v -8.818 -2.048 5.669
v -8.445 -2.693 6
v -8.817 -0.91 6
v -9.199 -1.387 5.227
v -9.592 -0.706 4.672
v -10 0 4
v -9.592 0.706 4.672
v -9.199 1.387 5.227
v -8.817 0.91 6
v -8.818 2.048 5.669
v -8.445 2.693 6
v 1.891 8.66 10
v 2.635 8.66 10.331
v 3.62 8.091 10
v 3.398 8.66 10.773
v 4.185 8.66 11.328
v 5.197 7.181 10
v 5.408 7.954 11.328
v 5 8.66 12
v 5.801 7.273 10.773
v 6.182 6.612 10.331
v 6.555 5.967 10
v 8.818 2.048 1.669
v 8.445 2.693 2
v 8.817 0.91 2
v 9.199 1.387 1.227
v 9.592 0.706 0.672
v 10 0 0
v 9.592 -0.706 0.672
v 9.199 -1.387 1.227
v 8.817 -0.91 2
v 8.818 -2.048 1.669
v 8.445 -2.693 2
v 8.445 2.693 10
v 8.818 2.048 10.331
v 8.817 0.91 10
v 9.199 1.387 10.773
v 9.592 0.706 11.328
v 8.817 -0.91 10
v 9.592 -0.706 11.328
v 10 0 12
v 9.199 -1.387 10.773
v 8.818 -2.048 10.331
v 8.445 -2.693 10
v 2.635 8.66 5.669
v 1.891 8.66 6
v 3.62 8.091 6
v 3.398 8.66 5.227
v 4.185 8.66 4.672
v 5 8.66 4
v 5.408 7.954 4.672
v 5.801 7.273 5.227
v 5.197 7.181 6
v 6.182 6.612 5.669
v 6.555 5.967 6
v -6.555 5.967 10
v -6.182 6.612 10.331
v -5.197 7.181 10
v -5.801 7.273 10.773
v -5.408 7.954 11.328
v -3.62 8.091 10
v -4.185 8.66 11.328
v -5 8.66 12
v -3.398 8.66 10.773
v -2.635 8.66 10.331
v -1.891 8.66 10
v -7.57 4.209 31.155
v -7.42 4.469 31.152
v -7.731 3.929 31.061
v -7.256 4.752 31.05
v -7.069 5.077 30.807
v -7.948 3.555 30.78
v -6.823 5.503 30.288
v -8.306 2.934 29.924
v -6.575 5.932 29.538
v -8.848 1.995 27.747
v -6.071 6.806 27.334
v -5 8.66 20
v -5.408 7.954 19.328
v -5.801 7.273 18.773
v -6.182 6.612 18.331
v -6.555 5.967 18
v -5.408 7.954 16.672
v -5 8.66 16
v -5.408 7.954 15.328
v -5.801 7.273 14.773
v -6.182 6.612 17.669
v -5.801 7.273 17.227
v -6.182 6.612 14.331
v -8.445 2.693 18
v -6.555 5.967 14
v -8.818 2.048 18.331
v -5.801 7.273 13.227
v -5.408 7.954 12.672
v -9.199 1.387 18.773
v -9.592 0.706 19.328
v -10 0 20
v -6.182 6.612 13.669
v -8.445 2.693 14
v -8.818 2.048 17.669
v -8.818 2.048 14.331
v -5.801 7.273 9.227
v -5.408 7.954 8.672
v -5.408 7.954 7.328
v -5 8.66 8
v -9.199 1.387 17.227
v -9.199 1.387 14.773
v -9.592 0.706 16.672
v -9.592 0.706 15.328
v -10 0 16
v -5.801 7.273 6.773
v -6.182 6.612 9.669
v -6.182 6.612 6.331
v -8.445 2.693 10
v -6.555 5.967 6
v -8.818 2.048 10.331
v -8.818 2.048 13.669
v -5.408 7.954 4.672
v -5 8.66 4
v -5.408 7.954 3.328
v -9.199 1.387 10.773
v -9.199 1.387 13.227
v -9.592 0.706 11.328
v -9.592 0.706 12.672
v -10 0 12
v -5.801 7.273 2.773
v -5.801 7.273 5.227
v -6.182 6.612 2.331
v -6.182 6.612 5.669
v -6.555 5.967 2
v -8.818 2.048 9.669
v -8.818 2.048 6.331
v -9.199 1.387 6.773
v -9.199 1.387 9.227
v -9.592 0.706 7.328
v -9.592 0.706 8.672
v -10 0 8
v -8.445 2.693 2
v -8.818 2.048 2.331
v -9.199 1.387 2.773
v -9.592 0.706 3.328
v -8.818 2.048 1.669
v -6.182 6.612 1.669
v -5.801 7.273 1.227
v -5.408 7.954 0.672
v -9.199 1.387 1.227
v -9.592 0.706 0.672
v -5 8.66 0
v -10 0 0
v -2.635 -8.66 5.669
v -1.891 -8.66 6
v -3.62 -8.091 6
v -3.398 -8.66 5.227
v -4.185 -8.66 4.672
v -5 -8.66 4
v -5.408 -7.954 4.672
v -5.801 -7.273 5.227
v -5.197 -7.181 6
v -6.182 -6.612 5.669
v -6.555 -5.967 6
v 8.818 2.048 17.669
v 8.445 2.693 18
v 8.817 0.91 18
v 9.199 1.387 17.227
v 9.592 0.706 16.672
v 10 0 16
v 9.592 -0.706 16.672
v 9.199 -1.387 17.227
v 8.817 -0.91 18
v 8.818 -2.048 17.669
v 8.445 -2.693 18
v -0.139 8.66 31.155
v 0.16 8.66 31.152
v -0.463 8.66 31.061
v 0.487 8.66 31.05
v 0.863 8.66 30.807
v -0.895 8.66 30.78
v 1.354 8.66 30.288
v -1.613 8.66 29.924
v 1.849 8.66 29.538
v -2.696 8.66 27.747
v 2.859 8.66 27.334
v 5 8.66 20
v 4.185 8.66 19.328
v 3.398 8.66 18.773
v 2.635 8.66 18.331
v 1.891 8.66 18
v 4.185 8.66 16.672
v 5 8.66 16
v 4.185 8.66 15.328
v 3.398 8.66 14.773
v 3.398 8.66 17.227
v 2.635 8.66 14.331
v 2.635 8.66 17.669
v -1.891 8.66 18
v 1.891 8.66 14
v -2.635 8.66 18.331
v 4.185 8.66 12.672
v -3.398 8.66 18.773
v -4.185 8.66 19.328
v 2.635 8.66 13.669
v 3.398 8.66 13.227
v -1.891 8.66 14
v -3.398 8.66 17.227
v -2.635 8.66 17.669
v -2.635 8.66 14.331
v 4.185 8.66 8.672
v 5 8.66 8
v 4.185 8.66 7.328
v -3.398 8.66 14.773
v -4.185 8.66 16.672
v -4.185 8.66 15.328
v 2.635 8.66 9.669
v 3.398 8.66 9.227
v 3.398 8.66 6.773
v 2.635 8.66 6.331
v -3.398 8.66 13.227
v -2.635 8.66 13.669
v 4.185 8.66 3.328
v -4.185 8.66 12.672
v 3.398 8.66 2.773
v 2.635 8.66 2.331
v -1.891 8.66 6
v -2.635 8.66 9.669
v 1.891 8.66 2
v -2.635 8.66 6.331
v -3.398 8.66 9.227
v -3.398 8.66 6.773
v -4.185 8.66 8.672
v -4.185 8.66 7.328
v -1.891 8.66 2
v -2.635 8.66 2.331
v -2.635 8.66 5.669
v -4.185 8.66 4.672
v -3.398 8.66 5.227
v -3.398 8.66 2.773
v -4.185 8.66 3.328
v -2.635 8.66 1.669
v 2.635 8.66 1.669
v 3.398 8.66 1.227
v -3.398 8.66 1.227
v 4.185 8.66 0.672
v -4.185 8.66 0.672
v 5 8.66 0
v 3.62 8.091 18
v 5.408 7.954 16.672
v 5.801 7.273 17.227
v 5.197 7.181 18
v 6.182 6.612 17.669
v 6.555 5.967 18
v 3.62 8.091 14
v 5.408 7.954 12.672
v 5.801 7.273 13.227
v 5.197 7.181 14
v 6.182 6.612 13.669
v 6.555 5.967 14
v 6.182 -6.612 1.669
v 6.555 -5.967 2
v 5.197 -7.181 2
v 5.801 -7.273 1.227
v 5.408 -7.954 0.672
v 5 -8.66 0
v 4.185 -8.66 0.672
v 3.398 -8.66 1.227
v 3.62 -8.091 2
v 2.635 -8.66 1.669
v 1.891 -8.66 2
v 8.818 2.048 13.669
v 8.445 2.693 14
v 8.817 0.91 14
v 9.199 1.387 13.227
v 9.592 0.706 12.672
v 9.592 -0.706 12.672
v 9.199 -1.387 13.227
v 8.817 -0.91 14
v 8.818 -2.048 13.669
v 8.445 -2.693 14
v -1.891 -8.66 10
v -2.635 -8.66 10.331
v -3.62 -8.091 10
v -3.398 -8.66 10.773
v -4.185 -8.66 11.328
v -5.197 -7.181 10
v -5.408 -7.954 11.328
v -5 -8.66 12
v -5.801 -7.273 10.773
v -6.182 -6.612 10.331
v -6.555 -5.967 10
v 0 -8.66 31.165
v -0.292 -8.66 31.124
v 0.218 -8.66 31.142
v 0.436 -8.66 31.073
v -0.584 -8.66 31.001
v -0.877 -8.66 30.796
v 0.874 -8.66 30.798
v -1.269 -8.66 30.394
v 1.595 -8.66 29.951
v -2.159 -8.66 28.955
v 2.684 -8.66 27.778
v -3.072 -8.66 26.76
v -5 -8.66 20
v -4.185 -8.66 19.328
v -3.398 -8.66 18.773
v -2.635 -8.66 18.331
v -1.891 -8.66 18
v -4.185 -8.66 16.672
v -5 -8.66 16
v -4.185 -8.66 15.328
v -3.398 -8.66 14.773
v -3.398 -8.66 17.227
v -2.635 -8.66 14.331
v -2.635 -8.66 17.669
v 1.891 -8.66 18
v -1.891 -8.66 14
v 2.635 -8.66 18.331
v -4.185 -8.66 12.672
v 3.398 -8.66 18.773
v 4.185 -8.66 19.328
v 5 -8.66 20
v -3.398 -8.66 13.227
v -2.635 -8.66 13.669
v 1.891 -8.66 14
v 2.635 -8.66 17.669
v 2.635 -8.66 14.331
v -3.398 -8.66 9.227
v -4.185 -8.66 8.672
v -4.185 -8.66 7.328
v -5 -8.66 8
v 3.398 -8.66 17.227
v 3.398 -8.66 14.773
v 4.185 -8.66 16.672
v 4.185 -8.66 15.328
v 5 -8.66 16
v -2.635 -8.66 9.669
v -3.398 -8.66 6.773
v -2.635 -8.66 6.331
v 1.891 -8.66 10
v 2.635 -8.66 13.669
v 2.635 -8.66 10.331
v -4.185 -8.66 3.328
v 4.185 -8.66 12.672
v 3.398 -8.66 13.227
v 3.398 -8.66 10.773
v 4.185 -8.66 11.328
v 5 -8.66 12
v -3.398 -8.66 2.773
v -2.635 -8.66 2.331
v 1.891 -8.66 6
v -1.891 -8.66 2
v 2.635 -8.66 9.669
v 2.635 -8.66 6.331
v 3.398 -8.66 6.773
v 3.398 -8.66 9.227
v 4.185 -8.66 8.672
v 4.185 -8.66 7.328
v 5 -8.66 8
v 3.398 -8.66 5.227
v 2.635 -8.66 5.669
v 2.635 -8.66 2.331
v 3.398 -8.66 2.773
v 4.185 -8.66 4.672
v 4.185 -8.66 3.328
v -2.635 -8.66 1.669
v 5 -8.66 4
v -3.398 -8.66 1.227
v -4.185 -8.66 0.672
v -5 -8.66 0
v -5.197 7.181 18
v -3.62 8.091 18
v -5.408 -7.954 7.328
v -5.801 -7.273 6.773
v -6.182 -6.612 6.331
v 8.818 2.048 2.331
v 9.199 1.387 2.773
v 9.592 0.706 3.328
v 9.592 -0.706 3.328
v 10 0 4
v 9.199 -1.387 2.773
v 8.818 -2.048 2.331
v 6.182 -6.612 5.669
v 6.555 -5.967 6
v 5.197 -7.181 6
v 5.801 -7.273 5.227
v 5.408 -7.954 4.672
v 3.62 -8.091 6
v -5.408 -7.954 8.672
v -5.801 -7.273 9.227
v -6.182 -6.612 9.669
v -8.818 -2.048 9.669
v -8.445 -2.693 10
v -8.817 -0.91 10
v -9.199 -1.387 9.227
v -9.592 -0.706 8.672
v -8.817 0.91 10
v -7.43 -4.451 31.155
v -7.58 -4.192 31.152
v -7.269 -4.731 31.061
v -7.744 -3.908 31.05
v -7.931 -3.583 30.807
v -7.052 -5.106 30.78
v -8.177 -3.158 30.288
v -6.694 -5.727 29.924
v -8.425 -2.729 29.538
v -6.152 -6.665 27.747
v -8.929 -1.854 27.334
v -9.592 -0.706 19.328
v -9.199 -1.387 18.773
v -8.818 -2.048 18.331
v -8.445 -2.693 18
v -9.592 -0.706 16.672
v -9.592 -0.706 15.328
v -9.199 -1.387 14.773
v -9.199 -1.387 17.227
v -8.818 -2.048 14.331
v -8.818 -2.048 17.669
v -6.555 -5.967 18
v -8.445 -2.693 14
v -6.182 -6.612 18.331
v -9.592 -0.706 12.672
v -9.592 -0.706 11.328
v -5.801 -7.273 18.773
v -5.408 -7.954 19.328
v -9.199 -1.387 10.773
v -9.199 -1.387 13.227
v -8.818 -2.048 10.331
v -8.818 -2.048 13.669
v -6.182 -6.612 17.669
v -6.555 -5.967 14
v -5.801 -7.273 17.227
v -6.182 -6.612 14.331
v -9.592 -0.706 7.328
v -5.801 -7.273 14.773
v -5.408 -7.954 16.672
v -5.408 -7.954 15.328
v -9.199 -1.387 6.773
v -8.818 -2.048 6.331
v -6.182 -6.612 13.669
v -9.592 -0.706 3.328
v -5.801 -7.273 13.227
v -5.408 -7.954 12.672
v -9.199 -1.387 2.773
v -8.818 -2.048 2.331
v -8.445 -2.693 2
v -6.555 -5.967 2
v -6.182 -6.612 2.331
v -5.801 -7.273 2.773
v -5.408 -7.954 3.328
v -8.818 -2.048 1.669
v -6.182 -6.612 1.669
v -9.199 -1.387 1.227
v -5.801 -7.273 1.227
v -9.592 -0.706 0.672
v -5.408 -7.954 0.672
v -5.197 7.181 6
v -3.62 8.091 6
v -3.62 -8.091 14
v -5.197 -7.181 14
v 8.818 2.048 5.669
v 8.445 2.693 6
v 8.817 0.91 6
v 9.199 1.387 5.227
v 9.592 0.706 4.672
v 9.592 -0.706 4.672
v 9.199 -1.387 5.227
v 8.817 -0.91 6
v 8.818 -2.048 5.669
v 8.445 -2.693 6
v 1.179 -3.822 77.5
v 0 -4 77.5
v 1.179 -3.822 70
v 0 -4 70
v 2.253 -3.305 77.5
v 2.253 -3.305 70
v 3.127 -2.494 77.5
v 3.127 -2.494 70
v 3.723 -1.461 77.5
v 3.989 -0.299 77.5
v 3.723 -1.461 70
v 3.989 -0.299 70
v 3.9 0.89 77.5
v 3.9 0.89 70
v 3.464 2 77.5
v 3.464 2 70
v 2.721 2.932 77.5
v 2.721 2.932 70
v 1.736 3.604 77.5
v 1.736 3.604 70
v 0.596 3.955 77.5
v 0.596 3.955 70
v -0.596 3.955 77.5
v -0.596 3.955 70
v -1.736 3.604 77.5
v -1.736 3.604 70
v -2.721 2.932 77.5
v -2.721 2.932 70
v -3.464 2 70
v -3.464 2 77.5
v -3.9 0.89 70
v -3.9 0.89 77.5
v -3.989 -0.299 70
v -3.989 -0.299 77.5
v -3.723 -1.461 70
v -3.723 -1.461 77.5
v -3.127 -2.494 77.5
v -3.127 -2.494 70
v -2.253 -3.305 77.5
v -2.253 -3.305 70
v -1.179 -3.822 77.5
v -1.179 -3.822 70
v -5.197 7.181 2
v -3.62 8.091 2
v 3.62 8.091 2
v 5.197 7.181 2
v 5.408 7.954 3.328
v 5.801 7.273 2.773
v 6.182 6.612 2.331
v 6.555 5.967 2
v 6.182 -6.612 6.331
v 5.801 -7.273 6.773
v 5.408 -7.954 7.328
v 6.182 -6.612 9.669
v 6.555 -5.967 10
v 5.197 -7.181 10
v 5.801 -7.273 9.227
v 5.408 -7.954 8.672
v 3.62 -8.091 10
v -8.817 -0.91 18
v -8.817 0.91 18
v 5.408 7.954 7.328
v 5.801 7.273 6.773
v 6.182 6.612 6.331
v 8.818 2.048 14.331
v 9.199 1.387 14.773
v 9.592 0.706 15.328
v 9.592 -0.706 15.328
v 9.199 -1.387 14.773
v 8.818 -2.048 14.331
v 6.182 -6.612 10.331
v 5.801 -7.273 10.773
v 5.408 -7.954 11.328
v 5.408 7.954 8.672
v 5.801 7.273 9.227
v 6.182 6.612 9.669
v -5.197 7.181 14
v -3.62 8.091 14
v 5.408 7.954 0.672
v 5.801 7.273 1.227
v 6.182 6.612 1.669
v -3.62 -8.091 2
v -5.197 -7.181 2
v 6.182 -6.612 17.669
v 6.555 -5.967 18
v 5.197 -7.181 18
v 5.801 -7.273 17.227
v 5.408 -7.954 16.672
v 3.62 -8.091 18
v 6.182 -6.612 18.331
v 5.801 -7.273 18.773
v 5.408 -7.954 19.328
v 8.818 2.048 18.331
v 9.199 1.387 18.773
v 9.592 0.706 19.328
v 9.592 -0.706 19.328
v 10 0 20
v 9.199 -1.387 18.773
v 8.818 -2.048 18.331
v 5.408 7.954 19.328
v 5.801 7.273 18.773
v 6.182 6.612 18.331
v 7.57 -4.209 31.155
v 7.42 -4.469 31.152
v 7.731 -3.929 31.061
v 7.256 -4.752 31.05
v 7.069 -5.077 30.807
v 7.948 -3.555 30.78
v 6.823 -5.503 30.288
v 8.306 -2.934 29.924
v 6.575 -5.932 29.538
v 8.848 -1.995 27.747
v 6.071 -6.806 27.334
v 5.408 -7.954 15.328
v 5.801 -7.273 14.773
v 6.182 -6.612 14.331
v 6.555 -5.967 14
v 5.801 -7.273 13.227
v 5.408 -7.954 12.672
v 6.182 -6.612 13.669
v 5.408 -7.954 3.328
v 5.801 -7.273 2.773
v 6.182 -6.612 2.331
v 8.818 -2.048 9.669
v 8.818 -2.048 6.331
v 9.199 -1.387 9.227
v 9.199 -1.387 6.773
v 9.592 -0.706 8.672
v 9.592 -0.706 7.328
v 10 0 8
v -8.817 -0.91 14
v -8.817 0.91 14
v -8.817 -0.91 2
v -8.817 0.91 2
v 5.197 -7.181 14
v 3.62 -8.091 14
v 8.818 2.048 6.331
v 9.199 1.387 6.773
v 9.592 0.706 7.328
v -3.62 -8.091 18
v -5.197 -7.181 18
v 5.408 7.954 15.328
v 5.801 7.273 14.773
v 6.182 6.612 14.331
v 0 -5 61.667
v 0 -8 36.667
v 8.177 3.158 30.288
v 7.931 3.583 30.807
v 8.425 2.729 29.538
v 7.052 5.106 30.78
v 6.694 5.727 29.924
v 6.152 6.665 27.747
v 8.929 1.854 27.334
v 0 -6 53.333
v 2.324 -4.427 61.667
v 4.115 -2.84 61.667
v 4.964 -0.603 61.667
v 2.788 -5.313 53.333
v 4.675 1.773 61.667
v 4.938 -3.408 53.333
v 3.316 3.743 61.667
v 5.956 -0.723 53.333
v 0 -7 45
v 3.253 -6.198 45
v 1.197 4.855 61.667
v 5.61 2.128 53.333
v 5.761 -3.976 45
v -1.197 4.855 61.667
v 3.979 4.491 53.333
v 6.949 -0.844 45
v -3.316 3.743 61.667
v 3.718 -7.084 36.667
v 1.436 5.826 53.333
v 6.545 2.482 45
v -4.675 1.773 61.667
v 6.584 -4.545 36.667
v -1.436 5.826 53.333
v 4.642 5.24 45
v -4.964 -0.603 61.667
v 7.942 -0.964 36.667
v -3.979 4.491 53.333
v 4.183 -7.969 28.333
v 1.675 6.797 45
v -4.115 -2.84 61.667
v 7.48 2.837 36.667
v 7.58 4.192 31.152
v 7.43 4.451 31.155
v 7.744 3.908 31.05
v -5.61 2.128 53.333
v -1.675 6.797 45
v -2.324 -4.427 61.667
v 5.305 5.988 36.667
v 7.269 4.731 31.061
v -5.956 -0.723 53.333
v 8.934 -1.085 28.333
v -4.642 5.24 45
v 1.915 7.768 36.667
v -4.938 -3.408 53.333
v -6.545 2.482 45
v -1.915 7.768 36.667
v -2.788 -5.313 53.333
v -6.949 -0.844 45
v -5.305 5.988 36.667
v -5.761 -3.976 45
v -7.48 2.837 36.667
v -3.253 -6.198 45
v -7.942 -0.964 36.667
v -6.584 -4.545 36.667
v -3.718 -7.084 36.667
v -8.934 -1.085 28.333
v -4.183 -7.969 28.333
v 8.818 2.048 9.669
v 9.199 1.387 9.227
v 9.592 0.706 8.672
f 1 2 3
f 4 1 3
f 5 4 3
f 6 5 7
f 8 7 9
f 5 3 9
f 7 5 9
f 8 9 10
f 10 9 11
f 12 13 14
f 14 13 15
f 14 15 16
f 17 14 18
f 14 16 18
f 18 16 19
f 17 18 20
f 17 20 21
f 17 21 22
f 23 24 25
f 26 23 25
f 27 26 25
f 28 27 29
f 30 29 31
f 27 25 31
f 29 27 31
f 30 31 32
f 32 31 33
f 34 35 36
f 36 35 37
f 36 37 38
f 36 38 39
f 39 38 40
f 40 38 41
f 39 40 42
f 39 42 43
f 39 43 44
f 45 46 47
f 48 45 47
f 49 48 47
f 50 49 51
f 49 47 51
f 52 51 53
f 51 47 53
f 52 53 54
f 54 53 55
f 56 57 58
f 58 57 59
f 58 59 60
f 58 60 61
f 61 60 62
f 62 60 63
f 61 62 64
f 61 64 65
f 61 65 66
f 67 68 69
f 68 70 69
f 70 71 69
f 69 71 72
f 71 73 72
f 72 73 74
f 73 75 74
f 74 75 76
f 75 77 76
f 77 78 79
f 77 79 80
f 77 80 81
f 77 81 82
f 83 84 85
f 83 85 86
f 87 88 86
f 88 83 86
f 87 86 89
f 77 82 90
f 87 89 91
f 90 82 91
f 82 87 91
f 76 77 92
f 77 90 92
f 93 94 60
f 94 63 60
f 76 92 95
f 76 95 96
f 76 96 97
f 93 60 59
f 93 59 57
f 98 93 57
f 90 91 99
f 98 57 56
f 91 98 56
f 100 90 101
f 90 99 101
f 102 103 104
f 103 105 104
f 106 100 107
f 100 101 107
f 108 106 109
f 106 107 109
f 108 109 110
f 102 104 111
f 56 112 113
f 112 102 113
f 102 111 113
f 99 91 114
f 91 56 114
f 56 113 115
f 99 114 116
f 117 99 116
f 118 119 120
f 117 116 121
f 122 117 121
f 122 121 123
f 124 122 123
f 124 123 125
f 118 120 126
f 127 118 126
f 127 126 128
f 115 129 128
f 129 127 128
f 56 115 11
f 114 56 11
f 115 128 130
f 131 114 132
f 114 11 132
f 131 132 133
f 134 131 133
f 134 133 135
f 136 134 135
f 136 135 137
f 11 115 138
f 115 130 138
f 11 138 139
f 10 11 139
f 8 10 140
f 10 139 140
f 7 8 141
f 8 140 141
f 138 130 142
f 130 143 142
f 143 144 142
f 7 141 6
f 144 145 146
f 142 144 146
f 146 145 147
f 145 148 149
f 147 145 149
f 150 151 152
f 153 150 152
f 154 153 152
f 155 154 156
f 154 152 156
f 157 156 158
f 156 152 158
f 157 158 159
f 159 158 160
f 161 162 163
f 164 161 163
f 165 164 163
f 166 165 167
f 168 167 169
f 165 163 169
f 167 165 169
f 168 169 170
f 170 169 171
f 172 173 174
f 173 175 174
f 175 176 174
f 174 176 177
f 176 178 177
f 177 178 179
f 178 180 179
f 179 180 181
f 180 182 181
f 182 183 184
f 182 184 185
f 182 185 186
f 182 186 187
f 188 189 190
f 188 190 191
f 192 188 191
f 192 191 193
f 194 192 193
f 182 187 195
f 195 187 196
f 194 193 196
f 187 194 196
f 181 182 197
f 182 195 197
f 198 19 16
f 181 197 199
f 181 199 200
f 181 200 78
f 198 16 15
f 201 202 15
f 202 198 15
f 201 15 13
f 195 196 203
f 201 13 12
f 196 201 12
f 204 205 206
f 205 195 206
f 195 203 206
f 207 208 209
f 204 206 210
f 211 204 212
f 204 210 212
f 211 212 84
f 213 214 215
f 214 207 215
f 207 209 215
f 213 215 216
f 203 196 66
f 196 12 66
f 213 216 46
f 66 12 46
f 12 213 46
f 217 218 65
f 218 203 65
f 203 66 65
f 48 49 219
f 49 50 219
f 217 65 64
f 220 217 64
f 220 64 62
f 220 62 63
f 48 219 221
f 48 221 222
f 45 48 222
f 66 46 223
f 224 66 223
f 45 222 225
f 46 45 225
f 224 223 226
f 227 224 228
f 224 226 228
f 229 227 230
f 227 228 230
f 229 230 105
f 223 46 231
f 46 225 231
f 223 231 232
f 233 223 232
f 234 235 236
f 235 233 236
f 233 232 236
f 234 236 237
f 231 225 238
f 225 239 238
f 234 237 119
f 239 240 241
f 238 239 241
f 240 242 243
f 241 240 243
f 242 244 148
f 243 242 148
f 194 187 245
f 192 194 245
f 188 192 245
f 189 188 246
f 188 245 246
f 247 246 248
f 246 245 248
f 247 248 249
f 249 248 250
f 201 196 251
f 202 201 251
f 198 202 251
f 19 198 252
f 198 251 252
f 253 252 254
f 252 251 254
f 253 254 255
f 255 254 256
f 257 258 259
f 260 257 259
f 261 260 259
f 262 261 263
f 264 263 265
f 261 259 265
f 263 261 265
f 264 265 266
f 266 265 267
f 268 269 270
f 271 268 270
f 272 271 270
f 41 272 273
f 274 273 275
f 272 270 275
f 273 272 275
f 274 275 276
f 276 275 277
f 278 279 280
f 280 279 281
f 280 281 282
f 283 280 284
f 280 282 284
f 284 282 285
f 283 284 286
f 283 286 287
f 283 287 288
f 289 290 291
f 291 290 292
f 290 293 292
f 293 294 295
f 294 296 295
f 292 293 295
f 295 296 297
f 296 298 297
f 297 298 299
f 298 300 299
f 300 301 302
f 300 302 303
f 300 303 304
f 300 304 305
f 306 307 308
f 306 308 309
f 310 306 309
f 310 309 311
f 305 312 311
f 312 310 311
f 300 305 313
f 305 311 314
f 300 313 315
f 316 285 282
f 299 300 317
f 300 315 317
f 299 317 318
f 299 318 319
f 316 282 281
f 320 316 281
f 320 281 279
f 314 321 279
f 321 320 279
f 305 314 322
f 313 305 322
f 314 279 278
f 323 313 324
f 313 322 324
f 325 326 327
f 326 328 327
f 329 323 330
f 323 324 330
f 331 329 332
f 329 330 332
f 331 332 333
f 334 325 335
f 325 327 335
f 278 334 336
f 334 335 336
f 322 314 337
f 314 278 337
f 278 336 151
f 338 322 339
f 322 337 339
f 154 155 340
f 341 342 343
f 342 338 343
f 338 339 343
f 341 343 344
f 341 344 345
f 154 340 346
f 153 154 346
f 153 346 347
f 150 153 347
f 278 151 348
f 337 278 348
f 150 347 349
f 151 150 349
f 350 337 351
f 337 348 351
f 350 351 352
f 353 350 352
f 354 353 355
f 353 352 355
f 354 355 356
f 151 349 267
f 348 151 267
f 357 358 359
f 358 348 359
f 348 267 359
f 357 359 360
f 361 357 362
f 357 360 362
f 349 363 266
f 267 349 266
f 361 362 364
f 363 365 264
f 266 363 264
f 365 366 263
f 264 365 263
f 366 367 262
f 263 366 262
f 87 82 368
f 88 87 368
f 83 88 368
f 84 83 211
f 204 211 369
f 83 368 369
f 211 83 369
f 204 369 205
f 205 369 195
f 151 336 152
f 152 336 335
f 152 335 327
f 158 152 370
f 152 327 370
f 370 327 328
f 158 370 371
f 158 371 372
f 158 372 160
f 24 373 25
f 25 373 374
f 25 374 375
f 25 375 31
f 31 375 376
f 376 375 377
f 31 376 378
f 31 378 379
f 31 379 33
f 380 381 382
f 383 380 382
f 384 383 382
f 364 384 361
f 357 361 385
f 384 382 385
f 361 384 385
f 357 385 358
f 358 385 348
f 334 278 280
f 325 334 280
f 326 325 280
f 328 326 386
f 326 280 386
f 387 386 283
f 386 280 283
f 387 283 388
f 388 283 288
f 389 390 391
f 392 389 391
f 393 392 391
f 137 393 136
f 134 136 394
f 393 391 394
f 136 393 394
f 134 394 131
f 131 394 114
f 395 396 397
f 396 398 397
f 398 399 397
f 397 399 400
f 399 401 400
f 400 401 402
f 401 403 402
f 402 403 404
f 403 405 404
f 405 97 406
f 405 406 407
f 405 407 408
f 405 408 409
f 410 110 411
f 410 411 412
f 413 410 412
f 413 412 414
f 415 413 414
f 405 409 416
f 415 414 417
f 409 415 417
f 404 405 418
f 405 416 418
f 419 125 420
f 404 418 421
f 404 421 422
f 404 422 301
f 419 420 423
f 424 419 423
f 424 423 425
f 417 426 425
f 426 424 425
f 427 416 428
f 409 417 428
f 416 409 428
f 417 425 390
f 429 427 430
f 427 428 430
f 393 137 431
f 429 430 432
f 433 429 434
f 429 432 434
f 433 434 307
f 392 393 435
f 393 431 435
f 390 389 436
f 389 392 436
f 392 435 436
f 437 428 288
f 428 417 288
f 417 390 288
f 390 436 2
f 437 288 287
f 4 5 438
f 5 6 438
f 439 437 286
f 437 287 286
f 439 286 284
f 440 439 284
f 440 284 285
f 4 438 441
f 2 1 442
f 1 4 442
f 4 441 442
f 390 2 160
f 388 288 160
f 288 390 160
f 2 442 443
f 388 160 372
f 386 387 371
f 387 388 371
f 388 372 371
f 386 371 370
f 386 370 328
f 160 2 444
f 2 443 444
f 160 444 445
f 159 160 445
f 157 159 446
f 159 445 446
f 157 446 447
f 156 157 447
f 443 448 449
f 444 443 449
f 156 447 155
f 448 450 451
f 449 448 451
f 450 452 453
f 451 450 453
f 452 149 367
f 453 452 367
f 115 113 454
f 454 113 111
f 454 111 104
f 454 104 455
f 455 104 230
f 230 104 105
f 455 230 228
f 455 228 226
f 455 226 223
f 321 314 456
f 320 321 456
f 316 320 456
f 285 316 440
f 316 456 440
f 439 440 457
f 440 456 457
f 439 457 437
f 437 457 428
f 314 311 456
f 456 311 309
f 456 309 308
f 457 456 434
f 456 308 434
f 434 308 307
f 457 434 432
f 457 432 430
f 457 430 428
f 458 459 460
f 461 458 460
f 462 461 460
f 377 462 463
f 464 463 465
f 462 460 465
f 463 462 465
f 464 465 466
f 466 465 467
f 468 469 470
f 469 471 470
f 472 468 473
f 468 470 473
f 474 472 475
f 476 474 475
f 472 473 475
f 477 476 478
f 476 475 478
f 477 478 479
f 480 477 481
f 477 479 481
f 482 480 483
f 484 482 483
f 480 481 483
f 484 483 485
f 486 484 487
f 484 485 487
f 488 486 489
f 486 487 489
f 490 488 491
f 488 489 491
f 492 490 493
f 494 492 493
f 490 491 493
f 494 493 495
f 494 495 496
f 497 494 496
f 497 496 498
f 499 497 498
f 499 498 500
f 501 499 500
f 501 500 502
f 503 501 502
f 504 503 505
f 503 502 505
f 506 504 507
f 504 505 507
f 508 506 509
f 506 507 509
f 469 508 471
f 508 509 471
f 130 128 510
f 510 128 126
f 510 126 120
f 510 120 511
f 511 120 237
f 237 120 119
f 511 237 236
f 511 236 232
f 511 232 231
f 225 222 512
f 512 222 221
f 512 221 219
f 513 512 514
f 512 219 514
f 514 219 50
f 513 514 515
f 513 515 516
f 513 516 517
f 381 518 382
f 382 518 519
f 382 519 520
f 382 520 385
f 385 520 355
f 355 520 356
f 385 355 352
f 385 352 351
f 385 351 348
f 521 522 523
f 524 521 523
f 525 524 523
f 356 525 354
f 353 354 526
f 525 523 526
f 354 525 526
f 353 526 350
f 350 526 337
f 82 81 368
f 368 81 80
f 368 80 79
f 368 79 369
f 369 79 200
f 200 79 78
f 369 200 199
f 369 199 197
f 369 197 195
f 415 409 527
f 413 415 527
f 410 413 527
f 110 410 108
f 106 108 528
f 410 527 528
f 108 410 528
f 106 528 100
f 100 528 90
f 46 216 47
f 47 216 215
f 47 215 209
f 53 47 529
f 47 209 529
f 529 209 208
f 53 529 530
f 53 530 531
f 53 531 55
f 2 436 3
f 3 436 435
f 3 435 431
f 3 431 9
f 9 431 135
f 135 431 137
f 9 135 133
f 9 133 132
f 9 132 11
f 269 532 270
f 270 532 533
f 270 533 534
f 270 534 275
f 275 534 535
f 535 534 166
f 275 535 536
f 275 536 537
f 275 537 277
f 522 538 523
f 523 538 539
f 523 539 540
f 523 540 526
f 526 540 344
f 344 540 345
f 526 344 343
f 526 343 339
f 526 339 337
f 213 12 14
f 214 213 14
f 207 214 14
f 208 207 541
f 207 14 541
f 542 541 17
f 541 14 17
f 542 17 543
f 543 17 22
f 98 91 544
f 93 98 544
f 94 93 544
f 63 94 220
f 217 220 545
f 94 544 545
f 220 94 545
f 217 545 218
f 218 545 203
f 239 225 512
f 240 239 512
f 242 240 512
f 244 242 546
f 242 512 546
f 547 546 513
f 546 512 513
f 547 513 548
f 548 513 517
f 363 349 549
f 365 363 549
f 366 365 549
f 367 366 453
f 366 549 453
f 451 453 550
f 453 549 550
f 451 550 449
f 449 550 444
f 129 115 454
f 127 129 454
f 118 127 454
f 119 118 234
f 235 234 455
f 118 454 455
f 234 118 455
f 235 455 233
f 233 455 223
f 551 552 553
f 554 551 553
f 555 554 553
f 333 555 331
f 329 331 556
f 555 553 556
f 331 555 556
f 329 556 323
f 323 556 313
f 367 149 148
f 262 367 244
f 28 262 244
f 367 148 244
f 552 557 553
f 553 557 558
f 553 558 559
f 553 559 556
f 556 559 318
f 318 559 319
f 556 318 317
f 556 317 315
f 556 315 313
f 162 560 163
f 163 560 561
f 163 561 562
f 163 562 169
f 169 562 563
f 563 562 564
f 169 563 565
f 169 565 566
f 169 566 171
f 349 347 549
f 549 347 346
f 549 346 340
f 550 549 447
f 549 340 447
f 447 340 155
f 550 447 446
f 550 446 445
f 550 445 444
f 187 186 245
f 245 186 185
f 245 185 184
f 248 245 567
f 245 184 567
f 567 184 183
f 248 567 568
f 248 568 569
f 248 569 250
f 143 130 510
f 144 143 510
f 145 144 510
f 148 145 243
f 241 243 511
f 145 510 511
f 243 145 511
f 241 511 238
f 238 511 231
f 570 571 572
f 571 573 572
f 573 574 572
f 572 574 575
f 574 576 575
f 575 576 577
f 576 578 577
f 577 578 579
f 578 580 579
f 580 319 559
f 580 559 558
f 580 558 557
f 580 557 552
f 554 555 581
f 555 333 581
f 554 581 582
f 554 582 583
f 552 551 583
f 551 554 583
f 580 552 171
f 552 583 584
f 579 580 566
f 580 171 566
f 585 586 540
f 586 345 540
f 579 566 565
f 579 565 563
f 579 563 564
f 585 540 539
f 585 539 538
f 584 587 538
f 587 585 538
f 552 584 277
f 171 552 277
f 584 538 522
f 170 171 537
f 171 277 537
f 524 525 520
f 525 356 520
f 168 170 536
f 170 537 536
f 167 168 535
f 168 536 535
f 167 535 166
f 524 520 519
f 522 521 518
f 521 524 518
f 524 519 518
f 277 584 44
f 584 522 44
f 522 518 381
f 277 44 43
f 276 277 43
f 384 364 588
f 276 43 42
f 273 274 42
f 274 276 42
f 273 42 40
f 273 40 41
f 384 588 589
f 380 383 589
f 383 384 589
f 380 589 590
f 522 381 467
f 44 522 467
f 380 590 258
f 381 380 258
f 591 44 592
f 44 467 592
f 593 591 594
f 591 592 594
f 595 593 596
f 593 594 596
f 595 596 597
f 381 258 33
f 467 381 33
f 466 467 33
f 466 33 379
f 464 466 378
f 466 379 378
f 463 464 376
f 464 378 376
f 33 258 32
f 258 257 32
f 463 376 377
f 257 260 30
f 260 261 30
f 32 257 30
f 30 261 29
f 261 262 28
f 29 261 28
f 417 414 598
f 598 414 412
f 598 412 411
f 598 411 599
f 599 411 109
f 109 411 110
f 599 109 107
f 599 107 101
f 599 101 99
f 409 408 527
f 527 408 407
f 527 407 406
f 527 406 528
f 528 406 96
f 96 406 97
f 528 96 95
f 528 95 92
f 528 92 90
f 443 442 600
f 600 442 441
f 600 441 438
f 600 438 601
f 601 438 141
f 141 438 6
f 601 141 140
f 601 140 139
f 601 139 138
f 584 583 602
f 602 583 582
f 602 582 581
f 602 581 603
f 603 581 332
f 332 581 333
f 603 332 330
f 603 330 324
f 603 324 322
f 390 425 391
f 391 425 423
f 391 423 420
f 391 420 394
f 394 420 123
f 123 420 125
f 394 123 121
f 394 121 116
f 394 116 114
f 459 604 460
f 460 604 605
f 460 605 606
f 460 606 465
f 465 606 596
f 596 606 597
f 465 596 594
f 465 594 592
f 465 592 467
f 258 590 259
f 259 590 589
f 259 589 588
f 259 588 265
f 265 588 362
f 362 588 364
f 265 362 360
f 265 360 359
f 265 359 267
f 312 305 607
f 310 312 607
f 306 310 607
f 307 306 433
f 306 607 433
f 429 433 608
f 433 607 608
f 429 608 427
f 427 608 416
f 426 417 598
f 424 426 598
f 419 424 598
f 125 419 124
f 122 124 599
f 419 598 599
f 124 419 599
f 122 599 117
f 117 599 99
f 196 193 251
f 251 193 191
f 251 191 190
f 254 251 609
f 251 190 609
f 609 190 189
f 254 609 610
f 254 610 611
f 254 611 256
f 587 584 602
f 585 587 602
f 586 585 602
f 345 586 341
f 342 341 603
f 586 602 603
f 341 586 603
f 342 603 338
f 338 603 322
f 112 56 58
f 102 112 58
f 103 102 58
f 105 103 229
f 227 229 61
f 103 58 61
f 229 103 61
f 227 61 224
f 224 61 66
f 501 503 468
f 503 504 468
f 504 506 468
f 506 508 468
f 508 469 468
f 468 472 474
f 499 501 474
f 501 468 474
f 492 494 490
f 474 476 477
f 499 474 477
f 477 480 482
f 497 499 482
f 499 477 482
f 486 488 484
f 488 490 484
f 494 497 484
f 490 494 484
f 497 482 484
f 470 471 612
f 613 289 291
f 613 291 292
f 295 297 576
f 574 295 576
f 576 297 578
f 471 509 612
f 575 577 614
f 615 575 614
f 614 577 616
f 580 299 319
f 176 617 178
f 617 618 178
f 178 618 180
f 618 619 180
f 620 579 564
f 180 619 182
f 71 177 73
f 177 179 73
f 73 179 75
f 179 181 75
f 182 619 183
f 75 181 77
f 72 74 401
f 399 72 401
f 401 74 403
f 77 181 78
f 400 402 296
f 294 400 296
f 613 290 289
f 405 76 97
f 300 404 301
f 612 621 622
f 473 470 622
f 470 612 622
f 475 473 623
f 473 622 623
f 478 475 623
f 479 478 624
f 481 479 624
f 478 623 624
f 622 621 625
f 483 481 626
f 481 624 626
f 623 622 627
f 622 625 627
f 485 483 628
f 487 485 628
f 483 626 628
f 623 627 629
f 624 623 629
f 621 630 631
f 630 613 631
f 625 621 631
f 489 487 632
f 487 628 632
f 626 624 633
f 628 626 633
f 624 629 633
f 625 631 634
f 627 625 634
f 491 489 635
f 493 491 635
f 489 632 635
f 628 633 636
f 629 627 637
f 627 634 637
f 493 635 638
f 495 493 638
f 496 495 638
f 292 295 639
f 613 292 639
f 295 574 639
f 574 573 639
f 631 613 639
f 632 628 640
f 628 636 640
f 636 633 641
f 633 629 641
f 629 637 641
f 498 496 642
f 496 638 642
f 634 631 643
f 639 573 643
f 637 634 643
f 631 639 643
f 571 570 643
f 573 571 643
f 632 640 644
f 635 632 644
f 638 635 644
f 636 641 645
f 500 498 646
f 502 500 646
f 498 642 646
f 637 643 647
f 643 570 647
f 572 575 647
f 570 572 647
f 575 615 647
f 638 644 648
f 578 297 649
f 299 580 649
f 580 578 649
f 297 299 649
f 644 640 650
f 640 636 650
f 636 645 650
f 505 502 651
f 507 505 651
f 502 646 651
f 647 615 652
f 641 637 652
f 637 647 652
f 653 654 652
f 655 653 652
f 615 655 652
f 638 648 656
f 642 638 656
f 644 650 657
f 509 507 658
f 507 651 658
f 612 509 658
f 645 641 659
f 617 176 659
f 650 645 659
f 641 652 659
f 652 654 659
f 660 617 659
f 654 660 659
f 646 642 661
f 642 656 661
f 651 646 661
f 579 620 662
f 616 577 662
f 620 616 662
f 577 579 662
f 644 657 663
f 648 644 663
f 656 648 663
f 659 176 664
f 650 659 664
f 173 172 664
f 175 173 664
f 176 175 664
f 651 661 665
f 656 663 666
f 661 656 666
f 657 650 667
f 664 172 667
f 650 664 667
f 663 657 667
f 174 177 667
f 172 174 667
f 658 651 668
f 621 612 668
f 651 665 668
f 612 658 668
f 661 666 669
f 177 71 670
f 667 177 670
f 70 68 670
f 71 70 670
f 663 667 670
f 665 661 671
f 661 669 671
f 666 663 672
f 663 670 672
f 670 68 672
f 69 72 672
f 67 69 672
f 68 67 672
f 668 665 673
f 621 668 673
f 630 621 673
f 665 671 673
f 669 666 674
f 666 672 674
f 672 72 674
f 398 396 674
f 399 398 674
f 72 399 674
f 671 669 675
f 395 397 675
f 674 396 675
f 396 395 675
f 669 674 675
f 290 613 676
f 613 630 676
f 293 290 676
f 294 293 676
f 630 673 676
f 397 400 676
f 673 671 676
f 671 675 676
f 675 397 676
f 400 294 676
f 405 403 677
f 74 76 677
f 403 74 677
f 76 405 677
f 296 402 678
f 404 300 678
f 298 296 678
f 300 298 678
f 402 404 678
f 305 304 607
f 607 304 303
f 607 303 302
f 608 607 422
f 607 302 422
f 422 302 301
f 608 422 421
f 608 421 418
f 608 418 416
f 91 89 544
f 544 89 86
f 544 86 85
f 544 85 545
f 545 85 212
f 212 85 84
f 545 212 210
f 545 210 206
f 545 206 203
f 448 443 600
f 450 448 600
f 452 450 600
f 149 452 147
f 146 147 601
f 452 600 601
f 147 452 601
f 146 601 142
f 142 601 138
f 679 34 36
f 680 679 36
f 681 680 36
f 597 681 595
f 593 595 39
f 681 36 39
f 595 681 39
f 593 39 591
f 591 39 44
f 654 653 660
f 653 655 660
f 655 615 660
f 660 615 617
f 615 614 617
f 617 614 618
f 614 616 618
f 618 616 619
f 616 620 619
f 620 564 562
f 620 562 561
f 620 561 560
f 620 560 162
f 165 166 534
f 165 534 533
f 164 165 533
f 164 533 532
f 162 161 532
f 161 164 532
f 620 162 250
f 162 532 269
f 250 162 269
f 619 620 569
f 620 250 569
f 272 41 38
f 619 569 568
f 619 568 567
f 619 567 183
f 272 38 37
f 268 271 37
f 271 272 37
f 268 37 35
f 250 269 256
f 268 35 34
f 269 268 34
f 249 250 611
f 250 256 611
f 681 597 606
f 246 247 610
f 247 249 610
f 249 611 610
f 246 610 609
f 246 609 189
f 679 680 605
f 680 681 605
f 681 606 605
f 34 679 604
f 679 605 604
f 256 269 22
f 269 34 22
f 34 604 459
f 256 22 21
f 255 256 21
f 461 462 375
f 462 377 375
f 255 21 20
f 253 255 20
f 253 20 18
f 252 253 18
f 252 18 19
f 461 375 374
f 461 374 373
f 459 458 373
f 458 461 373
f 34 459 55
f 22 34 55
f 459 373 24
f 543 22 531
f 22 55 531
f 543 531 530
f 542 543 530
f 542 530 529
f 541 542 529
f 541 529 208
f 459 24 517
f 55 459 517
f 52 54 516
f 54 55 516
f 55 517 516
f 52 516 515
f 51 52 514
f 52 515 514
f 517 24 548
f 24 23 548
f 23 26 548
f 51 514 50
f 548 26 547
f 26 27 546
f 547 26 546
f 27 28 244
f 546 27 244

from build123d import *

# Parameters (mm, degrees)
F1_DEPTH = 20
F4_DEPTH = 25
F7_DEPTH = 1


with BuildPart() as f1:
    # F0 (on Top) → F1 (new body)
    with BuildSketch(Plane.XY):
        Polygon((10, 0), (5, 8.6602540378), (-5, 8.6602540378), (-10, 0), (-5, -8.6602540378), (5, -8.6602540378), align=None)
    extrude(amount=F1_DEPTH)

    # F2 (on Right) → F3 (revolve)
    with BuildSketch(Plane.YZ):
        Polygon((-4, 76.5), (-4, 70), (-10, 20), (0, 20), (0, 70), (0, 76.5), align=None)
    revolve(axis=Axis((0, 0, 45), (0, 0, 1)))

    # F4 (cut): faces of the model
    f4_faces = [f1.faces().sort_by_distance(p)[0] for p in [
        (-7.9668740123, 4.5996768556, 20),
        (0, 9.1993537112, 20),
        (-7.9668740123, -4.5996768556, 20),
        (0, -9.1993537112, 20),
        (7.9668740123, -4.5996768556, 20),
        (7.9668740123, 4.5996768556, 20),
    ]]
    extrude(f4_faces, amount=-F4_DEPTH, mode=Mode.SUBTRACT)

    # F5 (on Front) → F6 (revolve, cut)
    with BuildSketch(Plane.XZ):
        Polygon((-8.8642183308, 18), (-10, 20), (-10, 16), align=None)
        Polygon((-8.8642183308, 2), (-10, 4), (-10, 0), align=None)
        Polygon((-8.8642183308, 6), (-10, 8), (-10, 4), align=None)
        Polygon((-8.8642183308, 10), (-10, 12), (-10, 8), align=None)
        Polygon((-8.8642183308, 14), (-10, 16), (-10, 12), align=None)
    revolve(axis=Axis((0, 0, 5.5472087115), (0, 0, -1)), mode=Mode.SUBTRACT)

    # F7 (add): a face of the model
    f7_faces = [f1.faces().sort_by_distance(p)[0] for p in [
        (0, 0, 76.5),
    ]]
    extrude(f7_faces, amount=F7_DEPTH)


solid = f1.part
